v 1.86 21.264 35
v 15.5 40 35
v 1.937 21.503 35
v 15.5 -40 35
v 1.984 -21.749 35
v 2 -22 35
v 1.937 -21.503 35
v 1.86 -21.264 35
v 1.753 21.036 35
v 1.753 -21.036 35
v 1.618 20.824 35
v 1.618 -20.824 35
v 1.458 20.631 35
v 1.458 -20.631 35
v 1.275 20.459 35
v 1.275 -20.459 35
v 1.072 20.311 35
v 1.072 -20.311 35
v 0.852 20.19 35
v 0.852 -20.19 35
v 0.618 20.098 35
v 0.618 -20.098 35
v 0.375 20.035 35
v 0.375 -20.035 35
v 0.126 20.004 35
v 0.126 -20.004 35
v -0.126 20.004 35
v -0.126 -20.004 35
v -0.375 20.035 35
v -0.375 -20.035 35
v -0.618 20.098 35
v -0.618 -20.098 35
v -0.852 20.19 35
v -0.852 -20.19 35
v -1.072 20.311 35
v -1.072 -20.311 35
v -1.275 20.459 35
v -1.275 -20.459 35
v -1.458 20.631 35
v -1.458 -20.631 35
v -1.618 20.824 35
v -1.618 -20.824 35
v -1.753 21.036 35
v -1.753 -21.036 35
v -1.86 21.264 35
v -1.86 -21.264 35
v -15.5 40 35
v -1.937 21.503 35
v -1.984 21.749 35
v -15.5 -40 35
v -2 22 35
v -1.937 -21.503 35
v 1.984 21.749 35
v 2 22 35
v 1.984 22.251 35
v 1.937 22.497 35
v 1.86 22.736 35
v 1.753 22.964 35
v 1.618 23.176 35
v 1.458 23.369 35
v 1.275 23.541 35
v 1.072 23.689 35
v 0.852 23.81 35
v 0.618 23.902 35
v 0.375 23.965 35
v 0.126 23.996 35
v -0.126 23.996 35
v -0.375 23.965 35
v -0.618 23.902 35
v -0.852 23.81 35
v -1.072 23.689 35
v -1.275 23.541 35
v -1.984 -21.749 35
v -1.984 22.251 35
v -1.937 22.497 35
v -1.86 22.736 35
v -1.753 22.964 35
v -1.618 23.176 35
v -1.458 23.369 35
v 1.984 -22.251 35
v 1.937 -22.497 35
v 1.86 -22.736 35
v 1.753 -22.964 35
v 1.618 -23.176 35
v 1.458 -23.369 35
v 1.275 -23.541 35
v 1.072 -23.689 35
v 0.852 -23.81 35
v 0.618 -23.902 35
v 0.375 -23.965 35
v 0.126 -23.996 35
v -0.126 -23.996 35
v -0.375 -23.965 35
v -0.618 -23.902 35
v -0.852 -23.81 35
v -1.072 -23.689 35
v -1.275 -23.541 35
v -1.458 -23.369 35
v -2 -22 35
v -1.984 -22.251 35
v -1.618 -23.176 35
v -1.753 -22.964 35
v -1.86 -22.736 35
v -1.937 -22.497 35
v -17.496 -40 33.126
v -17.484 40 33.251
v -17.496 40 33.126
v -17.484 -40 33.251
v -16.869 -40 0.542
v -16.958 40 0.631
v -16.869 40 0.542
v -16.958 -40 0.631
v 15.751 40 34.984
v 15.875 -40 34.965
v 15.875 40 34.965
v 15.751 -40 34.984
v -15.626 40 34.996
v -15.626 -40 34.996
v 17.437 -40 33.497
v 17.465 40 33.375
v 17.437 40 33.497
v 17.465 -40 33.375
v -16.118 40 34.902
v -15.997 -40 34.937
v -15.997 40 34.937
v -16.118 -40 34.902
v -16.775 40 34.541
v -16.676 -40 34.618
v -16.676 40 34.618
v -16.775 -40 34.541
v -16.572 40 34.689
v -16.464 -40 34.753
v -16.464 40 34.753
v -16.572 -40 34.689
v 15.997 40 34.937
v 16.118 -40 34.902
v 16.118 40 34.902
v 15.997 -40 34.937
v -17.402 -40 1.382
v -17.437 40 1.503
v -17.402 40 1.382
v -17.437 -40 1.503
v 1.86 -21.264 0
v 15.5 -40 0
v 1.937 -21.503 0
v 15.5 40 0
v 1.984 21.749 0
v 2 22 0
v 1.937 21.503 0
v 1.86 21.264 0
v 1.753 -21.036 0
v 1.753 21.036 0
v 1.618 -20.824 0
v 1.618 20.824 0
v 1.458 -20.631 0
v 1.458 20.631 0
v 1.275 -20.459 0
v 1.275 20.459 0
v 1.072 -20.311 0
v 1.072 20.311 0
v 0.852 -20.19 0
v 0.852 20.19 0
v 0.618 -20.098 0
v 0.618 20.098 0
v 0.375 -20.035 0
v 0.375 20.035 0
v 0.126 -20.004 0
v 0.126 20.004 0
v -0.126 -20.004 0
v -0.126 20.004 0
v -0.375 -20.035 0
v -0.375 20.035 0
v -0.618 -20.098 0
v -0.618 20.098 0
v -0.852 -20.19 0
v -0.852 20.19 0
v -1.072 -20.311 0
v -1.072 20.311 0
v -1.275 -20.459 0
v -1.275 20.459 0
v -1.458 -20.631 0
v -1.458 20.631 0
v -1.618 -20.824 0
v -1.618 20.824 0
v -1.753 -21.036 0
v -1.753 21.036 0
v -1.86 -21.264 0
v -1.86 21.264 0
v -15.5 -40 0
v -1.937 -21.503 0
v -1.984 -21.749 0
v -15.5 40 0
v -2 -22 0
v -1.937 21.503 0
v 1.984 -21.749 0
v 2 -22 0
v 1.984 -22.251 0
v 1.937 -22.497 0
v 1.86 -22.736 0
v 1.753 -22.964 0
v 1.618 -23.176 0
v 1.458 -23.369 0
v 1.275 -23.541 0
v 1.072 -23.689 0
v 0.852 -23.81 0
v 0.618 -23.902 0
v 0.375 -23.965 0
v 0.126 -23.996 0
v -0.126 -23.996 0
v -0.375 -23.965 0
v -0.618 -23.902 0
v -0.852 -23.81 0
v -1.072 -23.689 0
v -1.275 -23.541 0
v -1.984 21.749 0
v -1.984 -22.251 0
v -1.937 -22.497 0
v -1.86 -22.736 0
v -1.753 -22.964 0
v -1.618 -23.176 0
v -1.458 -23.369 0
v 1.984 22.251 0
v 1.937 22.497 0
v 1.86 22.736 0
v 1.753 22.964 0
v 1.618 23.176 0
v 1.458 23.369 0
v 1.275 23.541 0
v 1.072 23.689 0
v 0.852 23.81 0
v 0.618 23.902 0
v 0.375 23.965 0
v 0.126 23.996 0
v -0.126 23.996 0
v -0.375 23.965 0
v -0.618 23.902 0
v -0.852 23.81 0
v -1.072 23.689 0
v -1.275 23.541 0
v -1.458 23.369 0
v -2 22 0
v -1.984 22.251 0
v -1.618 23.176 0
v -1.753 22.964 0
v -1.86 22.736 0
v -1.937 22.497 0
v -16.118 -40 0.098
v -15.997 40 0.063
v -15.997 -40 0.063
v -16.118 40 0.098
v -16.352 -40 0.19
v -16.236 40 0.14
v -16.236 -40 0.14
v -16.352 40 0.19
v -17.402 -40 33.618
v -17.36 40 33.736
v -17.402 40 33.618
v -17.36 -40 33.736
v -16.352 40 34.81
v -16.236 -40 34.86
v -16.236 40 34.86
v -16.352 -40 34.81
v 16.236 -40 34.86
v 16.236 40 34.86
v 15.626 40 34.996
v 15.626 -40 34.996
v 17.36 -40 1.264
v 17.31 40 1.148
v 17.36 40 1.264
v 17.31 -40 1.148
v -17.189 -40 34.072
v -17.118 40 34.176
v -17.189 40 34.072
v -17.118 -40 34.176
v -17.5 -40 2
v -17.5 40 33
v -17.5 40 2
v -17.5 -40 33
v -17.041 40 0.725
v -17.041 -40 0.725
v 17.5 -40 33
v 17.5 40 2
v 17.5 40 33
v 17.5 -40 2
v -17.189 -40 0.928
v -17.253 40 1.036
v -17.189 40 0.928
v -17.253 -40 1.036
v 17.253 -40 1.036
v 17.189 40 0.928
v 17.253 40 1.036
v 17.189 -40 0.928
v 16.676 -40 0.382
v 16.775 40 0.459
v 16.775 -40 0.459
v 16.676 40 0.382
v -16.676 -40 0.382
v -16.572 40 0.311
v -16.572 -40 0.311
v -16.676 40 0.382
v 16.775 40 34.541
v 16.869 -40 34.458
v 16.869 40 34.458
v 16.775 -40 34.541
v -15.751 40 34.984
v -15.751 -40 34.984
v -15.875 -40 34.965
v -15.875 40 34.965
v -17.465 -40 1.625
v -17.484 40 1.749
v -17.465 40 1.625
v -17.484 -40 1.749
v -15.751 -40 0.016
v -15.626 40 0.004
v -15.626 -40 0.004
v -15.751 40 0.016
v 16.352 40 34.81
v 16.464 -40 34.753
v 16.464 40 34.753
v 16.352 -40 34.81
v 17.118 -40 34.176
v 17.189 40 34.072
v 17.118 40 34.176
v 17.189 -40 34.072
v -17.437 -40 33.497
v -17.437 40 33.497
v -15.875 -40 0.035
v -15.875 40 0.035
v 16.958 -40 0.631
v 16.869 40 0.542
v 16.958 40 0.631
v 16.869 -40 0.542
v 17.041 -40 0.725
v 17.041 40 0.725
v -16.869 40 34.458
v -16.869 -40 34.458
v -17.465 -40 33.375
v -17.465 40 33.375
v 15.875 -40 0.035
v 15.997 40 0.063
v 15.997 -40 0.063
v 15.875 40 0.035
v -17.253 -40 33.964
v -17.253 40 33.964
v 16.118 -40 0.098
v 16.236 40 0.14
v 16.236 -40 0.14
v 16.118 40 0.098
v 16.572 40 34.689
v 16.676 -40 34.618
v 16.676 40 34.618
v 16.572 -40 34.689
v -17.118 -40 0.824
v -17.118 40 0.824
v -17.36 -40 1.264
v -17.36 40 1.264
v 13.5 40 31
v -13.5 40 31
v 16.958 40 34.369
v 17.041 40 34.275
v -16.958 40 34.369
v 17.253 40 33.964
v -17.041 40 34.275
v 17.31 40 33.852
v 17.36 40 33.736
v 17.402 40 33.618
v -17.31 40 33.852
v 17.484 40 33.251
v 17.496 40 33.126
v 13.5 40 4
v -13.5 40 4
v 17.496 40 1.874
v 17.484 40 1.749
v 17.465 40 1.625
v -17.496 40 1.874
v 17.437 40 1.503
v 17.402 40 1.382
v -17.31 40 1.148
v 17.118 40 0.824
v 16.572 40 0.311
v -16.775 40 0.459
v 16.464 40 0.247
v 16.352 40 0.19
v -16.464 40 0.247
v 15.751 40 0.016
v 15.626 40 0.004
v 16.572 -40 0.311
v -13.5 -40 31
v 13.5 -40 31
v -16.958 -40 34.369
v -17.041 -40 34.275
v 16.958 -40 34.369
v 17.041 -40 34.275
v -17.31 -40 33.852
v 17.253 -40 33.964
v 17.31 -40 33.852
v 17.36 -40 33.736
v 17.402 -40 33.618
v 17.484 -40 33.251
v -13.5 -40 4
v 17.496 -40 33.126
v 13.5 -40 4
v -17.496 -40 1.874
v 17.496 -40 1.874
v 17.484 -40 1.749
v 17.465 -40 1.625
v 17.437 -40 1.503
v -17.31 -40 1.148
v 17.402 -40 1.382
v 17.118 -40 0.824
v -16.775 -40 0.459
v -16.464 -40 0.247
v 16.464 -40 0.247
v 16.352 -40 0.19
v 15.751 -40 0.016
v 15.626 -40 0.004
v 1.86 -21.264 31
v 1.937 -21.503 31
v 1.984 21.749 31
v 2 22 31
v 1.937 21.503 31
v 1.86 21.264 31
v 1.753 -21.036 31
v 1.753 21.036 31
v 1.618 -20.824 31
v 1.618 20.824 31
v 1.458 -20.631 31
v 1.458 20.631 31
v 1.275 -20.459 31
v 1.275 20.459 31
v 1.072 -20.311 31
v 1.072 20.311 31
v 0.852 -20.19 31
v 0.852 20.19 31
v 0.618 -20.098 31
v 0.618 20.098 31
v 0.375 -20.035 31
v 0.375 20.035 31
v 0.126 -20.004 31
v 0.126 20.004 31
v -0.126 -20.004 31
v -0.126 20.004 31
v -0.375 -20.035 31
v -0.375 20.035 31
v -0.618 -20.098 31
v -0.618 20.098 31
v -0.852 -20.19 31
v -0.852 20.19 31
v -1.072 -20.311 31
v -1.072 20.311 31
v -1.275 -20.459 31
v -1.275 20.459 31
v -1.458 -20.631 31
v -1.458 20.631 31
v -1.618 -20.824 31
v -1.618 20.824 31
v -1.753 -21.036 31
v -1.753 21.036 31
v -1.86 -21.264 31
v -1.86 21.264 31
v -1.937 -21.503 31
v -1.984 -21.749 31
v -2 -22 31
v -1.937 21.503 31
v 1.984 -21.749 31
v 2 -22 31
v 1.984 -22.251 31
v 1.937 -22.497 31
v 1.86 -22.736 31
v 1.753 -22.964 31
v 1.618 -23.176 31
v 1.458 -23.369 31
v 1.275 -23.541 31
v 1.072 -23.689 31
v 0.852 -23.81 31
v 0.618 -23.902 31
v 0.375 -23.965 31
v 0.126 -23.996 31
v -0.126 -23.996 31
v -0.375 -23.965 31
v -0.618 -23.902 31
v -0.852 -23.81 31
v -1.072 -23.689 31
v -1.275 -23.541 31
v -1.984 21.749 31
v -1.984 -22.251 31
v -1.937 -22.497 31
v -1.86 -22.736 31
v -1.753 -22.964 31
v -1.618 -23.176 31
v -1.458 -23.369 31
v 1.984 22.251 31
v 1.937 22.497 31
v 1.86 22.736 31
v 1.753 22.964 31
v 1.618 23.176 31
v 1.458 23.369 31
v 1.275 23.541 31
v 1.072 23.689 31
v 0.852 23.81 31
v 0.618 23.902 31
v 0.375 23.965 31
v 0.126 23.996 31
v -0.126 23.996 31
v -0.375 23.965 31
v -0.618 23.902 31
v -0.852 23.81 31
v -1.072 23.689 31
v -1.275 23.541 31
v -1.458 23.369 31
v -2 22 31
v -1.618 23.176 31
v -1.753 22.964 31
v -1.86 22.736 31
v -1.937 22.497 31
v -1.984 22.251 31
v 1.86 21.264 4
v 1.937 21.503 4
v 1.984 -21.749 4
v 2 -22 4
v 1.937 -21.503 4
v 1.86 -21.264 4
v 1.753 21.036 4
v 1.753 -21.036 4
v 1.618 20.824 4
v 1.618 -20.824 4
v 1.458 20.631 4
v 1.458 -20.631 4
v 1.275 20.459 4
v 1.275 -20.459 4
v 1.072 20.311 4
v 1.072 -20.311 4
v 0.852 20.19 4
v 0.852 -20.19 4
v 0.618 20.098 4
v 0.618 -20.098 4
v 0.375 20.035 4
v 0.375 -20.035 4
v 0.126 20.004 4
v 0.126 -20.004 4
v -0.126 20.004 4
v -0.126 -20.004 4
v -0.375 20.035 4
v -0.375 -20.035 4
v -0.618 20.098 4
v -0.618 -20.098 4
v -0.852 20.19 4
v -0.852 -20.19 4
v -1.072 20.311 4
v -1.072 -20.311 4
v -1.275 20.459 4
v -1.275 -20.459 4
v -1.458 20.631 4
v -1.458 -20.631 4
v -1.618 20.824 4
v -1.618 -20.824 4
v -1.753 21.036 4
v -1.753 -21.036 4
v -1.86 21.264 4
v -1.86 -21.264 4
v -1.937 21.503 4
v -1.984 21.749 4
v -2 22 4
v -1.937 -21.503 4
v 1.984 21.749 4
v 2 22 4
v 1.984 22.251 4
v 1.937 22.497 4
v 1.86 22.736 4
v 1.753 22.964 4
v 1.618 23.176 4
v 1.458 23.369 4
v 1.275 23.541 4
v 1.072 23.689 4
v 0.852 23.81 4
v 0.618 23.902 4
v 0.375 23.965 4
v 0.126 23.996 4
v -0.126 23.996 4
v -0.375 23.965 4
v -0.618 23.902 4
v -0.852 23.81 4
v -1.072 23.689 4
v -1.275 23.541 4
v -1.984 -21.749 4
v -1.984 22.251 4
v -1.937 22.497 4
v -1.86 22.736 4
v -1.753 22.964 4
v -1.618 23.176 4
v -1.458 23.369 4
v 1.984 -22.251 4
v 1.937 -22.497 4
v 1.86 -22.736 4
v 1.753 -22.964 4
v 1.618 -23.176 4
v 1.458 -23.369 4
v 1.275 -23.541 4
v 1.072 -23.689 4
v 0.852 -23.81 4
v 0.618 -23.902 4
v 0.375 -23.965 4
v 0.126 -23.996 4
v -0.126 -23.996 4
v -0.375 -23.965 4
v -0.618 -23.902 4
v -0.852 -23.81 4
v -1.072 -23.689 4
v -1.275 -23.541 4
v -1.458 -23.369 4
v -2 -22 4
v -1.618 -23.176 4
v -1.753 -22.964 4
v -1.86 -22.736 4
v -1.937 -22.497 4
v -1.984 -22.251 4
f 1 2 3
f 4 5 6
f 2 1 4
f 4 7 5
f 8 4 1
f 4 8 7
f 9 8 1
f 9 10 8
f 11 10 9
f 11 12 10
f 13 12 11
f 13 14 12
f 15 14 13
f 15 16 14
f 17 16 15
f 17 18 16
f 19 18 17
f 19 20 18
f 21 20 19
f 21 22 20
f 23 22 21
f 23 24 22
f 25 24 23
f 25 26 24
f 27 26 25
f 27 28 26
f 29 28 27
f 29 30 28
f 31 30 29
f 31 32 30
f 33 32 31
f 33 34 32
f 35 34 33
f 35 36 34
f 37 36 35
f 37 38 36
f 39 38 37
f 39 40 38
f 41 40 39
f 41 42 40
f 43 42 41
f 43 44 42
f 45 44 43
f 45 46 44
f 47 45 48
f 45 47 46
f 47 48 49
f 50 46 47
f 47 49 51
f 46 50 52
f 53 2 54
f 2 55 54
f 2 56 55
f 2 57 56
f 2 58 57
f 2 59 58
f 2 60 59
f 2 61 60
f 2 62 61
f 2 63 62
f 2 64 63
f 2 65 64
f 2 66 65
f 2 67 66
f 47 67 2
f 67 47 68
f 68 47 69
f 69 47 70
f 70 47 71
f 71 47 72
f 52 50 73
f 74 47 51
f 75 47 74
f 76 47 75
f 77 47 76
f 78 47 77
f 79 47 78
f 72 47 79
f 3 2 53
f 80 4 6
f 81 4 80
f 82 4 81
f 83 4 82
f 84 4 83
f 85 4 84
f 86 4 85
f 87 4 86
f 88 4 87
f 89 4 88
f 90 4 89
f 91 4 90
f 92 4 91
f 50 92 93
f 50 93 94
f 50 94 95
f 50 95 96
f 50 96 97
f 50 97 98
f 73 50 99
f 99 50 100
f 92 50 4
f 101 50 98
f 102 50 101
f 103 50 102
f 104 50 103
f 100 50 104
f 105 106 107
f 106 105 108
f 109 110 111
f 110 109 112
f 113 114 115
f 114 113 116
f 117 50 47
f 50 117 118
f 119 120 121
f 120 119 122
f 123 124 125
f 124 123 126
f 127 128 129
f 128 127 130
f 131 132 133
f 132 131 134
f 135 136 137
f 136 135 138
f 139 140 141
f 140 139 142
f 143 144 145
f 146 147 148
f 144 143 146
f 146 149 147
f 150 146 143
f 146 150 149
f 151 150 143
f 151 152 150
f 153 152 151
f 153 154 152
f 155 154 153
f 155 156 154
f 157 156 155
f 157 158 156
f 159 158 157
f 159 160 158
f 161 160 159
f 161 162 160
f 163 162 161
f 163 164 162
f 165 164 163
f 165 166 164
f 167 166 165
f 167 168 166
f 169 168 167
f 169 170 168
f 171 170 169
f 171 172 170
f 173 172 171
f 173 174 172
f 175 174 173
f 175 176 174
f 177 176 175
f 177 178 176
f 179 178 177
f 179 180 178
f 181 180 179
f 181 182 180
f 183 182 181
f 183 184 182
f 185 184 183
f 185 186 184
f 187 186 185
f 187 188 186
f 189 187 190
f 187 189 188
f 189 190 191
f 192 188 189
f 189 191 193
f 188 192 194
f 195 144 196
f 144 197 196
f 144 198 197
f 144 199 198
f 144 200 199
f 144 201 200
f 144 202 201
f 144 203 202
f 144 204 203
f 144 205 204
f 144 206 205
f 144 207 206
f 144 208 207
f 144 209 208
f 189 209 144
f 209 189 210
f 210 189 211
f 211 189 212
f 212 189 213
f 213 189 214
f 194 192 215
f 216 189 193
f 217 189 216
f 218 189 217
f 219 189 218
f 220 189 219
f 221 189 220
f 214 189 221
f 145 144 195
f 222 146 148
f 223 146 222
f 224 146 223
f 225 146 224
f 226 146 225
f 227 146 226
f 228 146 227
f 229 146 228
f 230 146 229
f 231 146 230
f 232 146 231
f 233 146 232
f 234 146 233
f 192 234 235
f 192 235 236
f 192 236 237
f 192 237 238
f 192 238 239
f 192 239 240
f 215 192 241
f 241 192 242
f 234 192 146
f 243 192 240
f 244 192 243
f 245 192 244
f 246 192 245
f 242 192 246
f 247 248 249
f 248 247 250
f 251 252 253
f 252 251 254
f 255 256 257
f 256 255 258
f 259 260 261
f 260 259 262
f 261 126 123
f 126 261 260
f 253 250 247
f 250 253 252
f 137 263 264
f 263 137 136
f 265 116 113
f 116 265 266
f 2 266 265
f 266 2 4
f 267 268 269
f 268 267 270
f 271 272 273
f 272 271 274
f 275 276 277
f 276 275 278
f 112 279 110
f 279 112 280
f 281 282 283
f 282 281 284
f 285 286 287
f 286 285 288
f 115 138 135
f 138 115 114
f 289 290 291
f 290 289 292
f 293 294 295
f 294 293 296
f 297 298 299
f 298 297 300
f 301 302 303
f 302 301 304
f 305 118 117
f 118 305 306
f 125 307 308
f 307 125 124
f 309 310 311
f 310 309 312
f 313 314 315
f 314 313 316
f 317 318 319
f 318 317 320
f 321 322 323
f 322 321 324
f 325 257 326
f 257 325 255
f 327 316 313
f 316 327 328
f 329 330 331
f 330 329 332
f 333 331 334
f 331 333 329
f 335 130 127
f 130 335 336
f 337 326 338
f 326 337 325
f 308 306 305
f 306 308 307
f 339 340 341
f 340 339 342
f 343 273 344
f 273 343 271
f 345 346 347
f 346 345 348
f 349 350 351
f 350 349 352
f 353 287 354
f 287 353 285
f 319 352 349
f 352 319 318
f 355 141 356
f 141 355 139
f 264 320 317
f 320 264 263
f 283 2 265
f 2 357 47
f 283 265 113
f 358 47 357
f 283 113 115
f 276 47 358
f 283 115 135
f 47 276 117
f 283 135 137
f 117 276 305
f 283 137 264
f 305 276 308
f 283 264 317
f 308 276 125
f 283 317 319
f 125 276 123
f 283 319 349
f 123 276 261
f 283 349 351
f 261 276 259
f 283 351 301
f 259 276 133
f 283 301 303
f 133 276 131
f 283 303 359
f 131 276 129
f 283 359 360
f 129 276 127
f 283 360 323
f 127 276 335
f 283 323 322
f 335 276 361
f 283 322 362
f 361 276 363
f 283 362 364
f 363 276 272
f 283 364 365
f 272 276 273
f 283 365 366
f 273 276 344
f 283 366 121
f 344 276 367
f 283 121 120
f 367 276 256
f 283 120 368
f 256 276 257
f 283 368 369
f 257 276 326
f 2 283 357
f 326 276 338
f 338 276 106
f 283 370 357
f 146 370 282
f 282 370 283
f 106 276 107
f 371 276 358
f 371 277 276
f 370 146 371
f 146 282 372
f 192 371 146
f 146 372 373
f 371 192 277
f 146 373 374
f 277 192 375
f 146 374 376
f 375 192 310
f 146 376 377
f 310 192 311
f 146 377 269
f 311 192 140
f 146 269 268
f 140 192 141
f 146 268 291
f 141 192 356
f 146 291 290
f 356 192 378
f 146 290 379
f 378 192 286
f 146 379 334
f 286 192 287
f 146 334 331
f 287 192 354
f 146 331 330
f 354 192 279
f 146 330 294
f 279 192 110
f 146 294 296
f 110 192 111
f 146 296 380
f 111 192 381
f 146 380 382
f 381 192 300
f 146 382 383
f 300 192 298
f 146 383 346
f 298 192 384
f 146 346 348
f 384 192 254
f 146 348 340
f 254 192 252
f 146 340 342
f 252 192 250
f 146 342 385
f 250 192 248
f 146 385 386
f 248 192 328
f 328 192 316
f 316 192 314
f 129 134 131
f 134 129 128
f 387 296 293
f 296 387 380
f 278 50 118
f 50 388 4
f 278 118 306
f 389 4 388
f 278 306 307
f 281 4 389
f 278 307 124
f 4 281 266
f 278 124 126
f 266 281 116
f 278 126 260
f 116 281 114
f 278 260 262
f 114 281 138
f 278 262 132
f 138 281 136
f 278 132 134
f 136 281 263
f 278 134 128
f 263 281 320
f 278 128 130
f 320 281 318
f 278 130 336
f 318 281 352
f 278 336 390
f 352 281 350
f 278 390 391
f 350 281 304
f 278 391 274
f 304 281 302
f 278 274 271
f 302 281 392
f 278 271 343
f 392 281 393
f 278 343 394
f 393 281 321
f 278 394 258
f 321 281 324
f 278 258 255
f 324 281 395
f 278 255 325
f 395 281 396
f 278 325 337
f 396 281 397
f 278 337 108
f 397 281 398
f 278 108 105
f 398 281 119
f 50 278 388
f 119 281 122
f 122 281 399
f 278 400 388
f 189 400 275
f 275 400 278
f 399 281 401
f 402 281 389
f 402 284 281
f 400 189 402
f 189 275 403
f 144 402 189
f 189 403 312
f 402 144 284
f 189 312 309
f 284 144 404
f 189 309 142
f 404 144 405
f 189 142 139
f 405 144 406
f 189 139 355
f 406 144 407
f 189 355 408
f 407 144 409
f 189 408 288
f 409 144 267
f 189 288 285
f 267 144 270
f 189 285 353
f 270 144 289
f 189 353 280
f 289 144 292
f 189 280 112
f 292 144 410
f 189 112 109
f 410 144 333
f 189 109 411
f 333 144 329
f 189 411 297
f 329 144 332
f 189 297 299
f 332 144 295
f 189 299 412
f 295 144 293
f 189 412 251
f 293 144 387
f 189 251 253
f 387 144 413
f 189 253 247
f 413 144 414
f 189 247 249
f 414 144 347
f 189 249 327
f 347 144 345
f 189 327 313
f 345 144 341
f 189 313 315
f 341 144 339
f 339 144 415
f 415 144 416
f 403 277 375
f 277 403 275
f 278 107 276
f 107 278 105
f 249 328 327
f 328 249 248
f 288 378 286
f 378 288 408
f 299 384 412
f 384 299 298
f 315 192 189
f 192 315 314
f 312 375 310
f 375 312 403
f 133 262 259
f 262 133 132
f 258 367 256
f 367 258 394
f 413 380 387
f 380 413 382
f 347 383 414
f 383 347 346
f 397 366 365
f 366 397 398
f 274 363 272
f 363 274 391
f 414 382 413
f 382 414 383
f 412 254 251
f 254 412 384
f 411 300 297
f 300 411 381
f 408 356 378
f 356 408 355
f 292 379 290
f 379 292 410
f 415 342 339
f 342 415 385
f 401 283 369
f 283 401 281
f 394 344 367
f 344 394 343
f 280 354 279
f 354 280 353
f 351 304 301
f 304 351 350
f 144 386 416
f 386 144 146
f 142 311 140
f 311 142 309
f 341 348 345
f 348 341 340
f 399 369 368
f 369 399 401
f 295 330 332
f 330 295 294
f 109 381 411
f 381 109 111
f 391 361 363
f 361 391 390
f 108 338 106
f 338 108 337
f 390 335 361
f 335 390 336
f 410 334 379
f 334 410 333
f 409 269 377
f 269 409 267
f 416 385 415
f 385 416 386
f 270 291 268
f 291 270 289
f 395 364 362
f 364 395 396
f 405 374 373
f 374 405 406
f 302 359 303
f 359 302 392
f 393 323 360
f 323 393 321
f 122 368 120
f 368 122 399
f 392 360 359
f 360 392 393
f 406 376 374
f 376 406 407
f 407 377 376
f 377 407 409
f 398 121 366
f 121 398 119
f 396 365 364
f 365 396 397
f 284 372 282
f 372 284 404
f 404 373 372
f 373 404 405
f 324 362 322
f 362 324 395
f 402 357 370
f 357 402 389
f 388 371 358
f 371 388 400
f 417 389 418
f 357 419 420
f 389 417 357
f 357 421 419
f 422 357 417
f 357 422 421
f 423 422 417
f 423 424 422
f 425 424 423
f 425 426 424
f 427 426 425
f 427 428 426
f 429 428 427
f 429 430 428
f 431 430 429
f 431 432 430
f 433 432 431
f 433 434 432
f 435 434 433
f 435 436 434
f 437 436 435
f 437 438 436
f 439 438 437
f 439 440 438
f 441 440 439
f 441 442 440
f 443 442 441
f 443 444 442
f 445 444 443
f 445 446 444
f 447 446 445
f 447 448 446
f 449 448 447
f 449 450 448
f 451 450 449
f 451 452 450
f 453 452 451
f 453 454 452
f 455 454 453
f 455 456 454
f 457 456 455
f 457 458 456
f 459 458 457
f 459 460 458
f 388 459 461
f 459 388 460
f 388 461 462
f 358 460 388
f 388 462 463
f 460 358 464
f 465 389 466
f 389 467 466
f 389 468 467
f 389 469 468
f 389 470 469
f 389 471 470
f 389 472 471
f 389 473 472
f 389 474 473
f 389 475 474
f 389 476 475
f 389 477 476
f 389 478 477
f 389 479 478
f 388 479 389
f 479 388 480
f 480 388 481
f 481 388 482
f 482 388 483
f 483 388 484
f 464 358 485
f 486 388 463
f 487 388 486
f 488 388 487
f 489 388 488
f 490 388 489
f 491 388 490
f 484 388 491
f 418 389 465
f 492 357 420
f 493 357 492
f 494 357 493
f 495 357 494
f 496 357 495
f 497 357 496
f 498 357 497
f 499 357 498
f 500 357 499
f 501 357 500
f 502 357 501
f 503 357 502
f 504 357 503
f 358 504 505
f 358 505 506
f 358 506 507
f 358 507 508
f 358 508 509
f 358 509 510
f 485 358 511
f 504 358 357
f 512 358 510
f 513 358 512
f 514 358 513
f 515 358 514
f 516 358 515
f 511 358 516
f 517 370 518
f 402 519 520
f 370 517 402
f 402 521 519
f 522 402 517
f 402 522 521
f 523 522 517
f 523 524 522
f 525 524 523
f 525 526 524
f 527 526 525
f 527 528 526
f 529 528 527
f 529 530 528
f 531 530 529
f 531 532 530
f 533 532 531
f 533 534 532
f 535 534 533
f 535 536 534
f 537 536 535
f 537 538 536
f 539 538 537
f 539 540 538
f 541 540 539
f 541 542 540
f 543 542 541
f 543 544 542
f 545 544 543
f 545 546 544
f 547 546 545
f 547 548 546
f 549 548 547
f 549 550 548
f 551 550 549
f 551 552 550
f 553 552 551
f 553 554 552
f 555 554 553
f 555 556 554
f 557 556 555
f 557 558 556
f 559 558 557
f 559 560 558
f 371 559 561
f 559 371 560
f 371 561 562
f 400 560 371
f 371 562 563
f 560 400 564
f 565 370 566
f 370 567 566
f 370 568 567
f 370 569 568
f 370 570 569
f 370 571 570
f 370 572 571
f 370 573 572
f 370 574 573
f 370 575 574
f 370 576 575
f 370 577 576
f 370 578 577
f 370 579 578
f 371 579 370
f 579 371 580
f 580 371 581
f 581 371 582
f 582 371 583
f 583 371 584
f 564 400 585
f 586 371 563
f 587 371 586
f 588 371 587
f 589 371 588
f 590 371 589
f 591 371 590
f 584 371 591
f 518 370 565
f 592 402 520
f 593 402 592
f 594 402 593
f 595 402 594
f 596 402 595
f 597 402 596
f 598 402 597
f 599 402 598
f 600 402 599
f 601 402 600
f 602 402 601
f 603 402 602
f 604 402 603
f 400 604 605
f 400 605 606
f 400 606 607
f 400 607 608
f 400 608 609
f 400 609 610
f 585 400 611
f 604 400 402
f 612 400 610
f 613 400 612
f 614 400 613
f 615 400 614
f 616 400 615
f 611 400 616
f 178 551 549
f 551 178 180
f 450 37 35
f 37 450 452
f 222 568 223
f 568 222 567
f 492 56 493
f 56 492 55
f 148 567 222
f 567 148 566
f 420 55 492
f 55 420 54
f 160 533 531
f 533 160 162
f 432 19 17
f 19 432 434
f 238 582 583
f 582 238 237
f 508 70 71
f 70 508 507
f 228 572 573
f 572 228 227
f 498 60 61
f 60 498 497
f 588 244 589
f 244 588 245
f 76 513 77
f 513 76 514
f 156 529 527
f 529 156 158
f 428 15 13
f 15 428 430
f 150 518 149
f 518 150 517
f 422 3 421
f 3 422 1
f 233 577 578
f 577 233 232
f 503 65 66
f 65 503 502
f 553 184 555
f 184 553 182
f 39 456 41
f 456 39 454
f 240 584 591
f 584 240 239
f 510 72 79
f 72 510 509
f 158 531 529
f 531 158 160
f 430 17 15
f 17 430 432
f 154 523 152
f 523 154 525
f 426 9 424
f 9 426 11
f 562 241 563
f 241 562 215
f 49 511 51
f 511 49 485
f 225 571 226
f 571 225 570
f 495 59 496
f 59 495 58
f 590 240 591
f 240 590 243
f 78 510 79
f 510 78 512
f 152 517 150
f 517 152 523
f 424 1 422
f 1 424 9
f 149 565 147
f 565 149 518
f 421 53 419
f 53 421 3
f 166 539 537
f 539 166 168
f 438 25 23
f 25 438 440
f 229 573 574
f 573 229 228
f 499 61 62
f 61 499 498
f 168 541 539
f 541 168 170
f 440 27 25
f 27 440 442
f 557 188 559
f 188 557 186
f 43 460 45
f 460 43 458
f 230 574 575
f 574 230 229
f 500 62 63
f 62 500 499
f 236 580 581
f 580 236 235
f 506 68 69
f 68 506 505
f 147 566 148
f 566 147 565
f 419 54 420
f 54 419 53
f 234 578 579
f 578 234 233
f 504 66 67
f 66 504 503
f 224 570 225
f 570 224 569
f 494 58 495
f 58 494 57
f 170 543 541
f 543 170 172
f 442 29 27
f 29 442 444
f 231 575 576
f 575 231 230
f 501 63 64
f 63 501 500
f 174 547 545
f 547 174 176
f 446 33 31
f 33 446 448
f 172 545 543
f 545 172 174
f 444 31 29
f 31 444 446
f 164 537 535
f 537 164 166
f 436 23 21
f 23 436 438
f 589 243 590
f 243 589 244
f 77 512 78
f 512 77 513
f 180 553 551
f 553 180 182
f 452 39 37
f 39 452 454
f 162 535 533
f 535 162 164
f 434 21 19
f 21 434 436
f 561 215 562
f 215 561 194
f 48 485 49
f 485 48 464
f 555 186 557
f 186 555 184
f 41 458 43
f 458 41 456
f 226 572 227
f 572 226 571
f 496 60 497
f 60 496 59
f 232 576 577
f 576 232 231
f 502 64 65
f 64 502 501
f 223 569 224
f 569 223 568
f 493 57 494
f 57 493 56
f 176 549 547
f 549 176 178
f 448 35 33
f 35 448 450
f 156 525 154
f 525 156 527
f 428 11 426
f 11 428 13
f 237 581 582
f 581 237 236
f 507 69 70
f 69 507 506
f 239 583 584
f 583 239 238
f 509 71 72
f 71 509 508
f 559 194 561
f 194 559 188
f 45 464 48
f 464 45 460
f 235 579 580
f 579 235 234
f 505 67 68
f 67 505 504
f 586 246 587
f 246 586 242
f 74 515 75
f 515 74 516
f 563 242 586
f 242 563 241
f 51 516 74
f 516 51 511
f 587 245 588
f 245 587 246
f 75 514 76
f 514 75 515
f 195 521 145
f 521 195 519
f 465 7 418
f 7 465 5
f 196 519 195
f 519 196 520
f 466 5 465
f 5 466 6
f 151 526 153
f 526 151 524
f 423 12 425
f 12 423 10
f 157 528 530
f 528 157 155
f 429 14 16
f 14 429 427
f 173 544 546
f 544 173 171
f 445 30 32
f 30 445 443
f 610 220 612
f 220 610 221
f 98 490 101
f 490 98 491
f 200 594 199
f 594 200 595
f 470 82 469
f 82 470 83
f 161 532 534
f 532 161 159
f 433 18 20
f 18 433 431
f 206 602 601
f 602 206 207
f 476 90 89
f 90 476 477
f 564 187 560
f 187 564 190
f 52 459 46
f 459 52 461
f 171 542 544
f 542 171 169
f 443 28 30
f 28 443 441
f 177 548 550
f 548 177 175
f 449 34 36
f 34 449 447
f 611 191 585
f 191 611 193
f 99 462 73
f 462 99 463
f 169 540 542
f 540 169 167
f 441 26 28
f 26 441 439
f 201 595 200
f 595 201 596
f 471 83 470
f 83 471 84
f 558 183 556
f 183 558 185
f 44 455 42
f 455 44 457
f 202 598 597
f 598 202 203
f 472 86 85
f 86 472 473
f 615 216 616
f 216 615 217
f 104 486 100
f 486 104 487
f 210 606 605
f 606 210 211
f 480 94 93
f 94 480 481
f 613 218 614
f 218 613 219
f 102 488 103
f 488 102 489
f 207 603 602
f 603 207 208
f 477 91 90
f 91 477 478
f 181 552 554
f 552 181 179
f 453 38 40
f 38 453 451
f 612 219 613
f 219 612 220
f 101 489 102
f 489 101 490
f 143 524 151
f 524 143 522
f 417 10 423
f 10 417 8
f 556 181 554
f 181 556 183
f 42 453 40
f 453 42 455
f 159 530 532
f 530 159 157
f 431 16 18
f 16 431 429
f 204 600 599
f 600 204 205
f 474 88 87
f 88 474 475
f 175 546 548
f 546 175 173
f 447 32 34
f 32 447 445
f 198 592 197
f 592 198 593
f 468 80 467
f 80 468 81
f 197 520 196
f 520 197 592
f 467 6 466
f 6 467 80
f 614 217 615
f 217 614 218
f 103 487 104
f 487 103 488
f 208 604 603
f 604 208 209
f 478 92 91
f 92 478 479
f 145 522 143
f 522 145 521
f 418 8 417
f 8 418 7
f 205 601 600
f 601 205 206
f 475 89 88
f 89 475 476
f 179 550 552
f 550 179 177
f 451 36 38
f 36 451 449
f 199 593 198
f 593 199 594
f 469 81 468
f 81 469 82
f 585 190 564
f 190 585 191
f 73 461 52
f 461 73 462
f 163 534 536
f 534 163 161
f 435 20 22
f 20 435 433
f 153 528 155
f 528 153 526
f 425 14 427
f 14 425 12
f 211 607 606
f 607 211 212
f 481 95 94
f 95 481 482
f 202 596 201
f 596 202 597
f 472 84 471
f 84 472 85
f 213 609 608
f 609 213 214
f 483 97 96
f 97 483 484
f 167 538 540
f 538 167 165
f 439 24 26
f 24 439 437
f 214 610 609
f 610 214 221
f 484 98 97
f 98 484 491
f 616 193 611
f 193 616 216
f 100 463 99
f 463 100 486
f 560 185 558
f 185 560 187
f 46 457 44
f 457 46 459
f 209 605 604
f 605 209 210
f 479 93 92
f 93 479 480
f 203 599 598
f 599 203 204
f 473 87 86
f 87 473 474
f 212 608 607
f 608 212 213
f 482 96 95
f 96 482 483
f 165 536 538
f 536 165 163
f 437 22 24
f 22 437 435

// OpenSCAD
lengthY = 80;
lengthX = 40;
woodX = 27;
wallThick = 4;
screwD = 4;


difference() {
    translate([0,0,0.5*woodX+wallThick])
        rotate([90,0,0]) attache(woodX,woodX,lengthY,wallThick);

    // Add holes for screws (1 hole per bar)
    /* X-Y plan below */
    translate([0,0.275*lengthY,-0.05]) 
        #cylinder(h=wallThick*2+woodX+0.1, d=screwD, $fn=50);
    translate([0,-(0.275*lengthY),-0.05]) 
        #cylinder(h=wallThick*2+woodX+0.1, d=screwD, $fn=50);
    
}

module attache(sizeX,sizeY,sizeZ,thick) {
difference() {
    roundedBox(sizeX+2*thick,sizeY+2*thick,sizeZ, thick/2);
    translate([0,0,-0.5*thick]) cube([sizeX,sizeY,sizeZ+3*thick], true);
}
}

module roundedBox(x,y,z,rad){
	hull() {
        translate([-x/2+rad, y/2-rad,-z/2]) cylinder(h=z,r=rad, $fn=100);
        translate([ x/2-rad, y/2-rad,-z/2]) cylinder(h=z,r=rad, $fn=100);
        translate([-x/2+rad,-y/2+rad,-z/2]) cylinder(h=z,r=rad, $fn=100);
        translate([ x/2-rad,-y/2+rad,-z/2]) cylinder(h=z,r=rad, $fn=100);
   }
}
